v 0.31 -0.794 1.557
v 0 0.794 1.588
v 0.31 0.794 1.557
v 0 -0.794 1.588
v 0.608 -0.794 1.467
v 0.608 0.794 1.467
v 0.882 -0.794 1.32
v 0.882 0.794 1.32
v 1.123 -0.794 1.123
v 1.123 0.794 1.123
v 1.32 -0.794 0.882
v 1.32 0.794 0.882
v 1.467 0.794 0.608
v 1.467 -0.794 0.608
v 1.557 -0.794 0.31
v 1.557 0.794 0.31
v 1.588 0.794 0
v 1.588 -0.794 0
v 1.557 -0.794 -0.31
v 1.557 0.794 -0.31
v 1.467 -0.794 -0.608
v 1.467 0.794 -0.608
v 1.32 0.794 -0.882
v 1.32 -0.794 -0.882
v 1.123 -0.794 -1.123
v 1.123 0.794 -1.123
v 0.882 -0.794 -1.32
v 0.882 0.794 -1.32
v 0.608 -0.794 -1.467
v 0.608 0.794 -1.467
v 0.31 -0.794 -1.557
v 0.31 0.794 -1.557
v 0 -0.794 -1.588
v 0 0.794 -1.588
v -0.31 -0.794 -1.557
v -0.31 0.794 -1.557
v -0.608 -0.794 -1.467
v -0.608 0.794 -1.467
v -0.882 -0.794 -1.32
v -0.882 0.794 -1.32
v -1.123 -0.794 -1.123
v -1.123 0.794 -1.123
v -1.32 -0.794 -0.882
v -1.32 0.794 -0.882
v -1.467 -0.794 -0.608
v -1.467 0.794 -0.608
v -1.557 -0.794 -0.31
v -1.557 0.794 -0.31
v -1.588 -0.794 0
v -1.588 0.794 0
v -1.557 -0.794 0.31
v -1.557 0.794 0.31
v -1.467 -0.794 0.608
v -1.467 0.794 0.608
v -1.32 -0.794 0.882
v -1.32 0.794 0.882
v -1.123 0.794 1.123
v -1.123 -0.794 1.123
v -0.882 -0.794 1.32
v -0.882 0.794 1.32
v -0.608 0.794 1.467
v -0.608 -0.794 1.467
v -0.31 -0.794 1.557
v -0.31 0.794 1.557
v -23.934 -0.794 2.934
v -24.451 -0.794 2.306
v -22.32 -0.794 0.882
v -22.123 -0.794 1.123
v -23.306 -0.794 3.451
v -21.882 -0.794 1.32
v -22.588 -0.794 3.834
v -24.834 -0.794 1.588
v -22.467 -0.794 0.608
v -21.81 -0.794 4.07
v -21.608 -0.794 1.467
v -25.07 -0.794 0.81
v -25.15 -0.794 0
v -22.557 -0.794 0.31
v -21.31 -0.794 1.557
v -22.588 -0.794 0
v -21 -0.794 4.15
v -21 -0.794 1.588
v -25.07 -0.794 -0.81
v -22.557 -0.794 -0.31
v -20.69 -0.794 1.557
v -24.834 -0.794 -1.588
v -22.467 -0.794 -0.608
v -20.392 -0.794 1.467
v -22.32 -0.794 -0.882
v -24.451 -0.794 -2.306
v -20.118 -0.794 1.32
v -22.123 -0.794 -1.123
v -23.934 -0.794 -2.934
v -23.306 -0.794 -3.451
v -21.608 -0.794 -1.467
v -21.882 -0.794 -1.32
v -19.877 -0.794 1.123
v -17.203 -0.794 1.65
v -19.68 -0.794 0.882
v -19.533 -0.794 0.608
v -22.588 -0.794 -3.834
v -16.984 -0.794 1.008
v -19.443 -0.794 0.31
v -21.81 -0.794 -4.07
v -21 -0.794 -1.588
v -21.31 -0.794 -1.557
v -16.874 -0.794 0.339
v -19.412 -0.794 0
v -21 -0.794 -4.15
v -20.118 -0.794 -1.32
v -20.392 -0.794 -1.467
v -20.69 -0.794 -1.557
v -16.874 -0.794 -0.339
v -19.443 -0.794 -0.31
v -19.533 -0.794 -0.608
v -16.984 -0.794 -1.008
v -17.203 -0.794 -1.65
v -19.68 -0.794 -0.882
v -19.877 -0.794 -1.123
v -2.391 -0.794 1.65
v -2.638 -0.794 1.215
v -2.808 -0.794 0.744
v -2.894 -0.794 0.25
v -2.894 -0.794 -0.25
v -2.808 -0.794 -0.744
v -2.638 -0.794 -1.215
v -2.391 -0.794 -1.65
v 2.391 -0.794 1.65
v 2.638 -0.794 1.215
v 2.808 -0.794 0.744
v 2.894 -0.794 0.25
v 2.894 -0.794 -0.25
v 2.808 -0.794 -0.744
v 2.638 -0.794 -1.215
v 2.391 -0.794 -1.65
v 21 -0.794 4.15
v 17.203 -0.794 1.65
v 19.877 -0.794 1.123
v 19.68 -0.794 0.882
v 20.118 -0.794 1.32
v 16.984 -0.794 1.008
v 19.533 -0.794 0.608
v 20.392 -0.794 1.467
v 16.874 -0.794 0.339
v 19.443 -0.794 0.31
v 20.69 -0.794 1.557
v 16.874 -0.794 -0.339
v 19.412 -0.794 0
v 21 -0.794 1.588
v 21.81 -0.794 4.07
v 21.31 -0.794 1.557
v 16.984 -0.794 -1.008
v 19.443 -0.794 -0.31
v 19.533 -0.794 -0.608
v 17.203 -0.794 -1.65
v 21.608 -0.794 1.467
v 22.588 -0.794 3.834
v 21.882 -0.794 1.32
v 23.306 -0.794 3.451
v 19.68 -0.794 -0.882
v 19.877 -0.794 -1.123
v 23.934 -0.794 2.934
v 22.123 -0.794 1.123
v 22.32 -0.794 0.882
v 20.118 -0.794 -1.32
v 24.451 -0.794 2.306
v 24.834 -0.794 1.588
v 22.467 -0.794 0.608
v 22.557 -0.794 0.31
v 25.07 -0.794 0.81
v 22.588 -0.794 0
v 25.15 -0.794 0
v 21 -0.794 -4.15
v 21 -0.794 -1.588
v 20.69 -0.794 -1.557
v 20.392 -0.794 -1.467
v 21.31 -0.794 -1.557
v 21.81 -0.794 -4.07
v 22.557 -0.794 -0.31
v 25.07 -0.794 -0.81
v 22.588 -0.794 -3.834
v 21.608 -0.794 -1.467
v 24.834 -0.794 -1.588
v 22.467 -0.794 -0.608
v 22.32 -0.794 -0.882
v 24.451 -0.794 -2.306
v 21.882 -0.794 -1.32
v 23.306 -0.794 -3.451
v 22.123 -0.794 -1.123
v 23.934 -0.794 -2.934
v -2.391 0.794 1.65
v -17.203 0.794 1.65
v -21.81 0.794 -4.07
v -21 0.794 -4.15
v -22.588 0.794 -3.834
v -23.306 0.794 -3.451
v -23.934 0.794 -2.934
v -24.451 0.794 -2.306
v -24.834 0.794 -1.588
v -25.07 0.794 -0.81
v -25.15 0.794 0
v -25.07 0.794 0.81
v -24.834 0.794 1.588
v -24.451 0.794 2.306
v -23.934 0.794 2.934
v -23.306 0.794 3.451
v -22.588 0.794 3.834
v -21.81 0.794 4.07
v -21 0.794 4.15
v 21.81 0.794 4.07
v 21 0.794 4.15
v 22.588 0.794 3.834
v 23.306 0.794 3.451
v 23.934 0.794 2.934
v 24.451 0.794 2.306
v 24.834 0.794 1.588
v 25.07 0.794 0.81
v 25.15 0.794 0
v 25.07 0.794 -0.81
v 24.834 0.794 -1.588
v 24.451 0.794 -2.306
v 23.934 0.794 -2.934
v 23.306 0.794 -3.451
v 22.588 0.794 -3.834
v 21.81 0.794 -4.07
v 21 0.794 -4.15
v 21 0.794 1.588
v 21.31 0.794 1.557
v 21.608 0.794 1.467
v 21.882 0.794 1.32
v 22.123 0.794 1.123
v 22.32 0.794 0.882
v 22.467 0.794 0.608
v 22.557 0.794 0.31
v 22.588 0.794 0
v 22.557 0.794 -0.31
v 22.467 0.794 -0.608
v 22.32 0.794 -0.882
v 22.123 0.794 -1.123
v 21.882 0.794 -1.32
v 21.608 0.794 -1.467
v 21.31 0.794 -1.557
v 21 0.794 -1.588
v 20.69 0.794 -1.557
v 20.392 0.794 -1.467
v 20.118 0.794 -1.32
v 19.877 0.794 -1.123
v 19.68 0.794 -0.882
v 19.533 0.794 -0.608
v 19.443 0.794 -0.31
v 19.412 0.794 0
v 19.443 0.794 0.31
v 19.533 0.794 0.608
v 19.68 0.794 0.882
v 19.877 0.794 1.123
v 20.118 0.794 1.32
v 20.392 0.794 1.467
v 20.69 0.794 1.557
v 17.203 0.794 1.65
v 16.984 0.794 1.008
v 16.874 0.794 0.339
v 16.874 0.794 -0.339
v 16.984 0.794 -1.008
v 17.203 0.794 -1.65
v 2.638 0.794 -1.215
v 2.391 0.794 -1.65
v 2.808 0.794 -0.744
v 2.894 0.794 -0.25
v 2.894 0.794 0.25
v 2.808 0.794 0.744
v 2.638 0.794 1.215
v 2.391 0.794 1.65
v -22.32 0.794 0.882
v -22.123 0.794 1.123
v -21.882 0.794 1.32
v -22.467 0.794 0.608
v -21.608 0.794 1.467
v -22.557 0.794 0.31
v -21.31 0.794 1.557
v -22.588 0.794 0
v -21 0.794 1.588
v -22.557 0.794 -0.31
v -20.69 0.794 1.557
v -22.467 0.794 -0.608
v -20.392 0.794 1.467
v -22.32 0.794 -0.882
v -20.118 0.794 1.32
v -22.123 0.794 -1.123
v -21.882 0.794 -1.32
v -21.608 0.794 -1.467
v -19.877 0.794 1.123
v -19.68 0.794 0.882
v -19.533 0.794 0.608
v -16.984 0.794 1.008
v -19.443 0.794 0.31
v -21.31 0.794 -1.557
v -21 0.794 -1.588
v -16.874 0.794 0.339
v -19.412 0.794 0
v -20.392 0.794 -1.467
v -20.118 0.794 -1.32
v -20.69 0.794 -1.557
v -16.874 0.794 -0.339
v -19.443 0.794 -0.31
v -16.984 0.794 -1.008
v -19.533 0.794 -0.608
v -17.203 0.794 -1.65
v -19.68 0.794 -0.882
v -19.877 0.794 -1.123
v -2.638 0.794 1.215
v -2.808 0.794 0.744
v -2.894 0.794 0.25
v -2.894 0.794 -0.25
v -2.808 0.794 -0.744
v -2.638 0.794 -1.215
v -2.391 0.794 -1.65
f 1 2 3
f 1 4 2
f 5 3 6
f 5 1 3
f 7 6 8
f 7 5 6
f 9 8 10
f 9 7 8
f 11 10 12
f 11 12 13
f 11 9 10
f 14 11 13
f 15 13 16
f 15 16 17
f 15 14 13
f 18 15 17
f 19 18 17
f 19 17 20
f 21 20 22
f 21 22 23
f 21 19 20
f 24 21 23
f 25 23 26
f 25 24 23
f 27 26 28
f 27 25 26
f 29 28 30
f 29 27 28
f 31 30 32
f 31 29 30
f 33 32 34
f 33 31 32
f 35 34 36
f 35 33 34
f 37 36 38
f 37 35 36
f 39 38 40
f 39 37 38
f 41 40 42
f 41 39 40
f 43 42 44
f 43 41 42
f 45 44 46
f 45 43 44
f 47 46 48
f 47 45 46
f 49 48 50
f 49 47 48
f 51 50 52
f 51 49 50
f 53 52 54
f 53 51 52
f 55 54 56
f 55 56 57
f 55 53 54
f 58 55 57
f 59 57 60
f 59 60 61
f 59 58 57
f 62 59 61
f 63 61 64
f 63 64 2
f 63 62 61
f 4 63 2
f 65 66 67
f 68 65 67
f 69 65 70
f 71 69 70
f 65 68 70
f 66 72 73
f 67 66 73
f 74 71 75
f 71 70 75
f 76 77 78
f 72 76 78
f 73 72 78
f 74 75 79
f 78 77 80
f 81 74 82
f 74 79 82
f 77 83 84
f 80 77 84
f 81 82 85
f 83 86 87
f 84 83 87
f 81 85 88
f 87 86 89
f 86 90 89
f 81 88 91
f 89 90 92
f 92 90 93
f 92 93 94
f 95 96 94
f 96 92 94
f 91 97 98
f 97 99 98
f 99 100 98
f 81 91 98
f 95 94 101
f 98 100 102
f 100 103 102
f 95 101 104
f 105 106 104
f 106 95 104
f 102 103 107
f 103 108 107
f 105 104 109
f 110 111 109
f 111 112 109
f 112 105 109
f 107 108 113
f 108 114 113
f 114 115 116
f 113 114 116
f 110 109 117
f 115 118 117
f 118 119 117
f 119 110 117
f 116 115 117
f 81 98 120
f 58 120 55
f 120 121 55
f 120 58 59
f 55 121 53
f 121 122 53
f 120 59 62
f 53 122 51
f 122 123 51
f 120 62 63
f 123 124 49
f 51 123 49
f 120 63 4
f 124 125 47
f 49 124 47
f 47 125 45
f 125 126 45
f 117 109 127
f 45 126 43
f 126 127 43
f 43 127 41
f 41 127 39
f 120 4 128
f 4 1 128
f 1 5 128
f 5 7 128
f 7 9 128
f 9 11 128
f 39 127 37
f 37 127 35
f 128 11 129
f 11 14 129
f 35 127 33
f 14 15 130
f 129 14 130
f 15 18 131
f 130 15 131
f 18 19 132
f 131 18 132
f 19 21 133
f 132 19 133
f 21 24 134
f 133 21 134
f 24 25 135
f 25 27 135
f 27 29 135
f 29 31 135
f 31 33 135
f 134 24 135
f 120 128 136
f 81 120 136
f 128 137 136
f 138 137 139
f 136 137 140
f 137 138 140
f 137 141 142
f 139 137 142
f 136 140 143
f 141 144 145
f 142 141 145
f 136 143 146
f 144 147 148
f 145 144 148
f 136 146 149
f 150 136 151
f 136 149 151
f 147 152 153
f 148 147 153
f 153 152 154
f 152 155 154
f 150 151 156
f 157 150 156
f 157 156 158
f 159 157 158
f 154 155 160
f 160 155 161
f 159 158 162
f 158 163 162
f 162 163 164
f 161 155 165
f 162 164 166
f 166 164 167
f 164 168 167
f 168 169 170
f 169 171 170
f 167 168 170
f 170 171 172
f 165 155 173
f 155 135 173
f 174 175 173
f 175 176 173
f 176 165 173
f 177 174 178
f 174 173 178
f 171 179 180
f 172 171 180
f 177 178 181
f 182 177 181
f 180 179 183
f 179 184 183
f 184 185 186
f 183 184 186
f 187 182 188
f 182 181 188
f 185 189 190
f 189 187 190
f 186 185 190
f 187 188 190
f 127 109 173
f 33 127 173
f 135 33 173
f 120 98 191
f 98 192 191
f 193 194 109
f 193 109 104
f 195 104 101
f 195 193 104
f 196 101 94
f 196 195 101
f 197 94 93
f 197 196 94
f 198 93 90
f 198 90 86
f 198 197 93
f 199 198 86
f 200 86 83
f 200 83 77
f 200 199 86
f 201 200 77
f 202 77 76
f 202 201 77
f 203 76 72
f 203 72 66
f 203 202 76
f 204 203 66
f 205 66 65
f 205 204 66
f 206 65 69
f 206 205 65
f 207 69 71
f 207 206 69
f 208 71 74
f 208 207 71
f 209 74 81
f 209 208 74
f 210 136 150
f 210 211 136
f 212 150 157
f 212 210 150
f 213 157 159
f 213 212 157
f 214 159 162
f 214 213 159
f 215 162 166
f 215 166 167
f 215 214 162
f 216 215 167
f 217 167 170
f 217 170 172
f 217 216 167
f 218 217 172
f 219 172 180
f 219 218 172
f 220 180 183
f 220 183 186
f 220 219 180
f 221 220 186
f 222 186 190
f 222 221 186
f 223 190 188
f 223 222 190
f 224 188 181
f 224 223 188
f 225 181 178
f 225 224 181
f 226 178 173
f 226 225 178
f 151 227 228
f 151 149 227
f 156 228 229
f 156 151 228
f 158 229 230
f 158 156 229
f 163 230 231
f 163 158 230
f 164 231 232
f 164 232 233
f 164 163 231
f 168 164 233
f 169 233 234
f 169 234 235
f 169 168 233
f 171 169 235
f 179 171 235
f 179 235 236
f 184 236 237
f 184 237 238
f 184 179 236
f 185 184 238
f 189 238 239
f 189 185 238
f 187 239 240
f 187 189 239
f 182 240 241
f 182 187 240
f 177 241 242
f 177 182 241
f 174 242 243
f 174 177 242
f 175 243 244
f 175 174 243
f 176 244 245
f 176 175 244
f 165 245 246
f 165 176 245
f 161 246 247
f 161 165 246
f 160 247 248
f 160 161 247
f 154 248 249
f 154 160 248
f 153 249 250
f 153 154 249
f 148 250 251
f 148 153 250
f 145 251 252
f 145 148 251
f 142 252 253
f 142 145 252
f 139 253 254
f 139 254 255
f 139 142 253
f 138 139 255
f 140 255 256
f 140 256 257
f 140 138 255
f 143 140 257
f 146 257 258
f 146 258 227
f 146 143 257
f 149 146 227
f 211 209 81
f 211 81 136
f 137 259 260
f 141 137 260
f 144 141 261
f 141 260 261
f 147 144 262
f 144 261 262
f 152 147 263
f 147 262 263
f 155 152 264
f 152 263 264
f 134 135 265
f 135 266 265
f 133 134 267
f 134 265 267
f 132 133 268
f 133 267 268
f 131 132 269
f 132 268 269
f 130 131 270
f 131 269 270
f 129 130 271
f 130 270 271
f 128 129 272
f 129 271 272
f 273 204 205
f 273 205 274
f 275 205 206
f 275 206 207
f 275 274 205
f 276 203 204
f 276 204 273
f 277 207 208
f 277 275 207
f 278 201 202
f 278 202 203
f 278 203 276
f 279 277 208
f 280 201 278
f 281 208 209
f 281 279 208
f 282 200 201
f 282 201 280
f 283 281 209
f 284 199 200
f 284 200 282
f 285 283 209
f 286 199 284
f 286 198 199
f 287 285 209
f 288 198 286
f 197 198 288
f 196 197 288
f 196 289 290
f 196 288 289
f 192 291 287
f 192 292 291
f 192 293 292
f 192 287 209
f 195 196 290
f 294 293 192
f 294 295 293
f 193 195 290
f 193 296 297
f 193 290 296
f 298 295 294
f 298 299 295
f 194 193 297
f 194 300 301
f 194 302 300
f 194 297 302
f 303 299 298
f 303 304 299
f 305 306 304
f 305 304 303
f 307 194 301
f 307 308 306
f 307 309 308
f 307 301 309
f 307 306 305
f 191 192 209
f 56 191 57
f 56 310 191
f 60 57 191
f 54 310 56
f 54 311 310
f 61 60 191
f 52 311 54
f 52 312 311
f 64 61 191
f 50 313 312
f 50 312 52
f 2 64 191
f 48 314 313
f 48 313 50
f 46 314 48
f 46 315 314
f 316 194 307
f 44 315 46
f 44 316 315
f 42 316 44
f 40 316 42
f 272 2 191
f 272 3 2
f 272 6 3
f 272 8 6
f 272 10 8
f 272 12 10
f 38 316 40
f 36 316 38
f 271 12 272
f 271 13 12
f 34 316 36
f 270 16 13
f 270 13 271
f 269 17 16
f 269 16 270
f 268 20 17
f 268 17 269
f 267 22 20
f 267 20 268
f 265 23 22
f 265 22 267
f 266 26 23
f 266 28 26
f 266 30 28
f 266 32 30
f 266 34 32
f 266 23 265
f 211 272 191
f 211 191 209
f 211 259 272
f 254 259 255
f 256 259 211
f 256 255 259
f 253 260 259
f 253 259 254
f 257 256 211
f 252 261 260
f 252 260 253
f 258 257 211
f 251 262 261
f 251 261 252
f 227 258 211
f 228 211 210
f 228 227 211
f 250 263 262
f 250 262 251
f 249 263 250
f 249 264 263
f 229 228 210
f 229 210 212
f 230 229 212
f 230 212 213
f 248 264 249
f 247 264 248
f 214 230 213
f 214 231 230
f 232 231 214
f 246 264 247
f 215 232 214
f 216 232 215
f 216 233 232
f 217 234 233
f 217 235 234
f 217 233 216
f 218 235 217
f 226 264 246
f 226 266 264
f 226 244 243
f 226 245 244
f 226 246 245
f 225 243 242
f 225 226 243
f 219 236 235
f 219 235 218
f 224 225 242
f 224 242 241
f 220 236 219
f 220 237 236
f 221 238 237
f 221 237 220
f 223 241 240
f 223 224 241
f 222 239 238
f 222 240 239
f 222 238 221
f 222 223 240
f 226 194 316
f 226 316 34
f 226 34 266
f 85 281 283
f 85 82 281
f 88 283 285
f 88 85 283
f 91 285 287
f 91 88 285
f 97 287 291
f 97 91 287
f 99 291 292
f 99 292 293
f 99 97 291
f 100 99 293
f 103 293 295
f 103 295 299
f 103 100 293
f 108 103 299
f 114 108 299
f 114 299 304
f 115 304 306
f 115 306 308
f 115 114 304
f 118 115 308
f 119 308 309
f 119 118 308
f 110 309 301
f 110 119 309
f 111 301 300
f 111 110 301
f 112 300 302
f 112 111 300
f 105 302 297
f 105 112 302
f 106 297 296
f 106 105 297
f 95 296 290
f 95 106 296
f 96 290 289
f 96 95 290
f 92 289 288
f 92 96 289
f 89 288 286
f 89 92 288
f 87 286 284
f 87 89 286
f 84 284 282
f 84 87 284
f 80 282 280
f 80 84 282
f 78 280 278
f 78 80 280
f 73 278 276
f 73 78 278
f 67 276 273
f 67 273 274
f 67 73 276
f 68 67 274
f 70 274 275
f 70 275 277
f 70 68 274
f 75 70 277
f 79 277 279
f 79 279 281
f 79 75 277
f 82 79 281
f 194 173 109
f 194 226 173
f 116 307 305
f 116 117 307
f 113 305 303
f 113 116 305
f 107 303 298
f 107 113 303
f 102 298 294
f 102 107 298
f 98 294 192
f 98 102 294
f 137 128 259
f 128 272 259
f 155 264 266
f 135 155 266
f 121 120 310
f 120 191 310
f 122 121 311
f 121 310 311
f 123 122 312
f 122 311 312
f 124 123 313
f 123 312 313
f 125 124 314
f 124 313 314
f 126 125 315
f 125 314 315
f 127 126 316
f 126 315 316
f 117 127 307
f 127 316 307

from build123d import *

# Parameters (mm, degrees)
SKETCH1_R           = 1.5875
BOSS_EXTRUDE2_DEPTH = 0.79375


with BuildPart() as part:
    # Sketch1 → Boss-Extrude2 (new, symmetric)
    with BuildSketch(Plane(origin=(0, 0, 0), x_dir=(1, 0, 0), z_dir=(0, 1, 0))):
        with BuildLine():
            Line((21, 4.15), (-21, 4.15))
            ThreePointArc((-21, 4.15), (-25.15, 0), (-21, -4.15))
            Line((-21, -4.15), (21, -4.15))
            ThreePointArc((21, -4.15), (25.15, 0), (21, 4.15))
        make_face()
        with Locations(Location((21, 0, 0), (0, 0, 270))):
            Circle(SKETCH1_R, mode=Mode.SUBTRACT)
        with Locations(Location((-21, 0, 0), (0, 0, 270))):
            Circle(SKETCH1_R, mode=Mode.SUBTRACT)
        with Locations(Location((0, 0, 0), (0, 0, 270))):
            Circle(SKETCH1_R, mode=Mode.SUBTRACT)
        with BuildLine():
            Line((17.202806092, 1.65), (2.390587638, 1.65))
            ThreePointArc((2.390587638, 1.65), (2.904721889, 0), (2.390587638, -1.65))
            Line((2.390587638, -1.65), (17.202806092, -1.65))
            ThreePointArc((17.202806092, -1.65), (16.859808992, 0), (17.202806092, 1.65))
        make_face(mode=Mode.SUBTRACT)
        with BuildLine():
            Line((-17.202806092, -1.65), (-2.390587638, -1.65))
            ThreePointArc((-2.390587638, -1.65), (-2.904721889, 0), (-2.390587638, 1.65))
            Line((-2.390587638, 1.65), (-17.202806092, 1.65))
            ThreePointArc((-17.202806092, 1.65), (-16.859808992, 0), (-17.202806092, -1.65))
        make_face(mode=Mode.SUBTRACT)
    extrude(amount=BOSS_EXTRUDE2_DEPTH, both=True)


solid = part.part
